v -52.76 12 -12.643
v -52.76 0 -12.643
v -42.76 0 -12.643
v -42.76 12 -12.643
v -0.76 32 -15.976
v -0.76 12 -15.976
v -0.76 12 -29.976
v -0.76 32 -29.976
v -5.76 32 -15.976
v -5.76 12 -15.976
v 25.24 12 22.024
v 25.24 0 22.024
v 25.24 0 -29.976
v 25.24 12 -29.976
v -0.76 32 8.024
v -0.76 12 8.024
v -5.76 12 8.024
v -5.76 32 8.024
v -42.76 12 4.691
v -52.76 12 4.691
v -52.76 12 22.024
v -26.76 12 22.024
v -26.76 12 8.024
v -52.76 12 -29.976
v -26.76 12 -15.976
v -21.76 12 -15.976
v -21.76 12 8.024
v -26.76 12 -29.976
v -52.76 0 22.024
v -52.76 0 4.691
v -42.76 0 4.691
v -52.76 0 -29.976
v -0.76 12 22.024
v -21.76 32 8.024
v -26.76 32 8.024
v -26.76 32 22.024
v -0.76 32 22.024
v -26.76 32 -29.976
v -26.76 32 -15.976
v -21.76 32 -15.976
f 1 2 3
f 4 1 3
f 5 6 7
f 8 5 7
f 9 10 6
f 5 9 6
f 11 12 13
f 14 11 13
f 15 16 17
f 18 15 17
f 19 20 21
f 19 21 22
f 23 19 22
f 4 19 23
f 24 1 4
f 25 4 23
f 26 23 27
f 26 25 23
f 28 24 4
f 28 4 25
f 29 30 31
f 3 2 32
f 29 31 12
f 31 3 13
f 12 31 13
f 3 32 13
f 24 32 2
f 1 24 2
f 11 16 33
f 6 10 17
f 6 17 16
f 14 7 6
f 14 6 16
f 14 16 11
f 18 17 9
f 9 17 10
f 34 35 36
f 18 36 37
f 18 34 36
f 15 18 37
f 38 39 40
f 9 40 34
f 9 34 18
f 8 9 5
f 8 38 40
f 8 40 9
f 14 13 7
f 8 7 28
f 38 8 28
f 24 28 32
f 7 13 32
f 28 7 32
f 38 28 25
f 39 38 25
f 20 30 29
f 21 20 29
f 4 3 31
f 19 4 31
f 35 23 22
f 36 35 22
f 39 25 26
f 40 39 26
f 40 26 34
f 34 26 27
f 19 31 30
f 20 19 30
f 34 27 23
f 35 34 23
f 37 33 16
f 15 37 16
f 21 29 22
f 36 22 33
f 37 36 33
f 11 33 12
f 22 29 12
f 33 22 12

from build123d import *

# Parameters (mm, degrees)
BOSS_EXTRUDE5_DEPTH   = 12
BOSS_EXTRUDE5_2_DEPTH = 12
BOSS_EXTRUDE6_DEPTH   = 32


with BuildPart() as part:
    # Sketch6 → Boss-Extrude5 (new body)
    with BuildSketch(Plane(origin=(0, 0, 0), x_dir=(1, 0, 0), z_dir=(0, 1, 0))):
        Polygon((-26.75977594, 29.975997565), (-52.75977594, 29.975997565), (-52.75977594, 12.642664232), (-42.75977594, 12.642664232), (-42.75977594, -4.690669102), (-52.75977594, -4.690669102), (-52.75977594, -22.024002435), (-26.75977594, -22.024002435), (-26.75977594, -8.024002435), (-21.75977594, -8.024002435), (-21.75977594, 15.975997565), (-26.75977594, 15.975997565), align=None)
    extrude(amount=BOSS_EXTRUDE5_DEPTH)



with BuildPart() as body_2:
    # Sketch6 → Boss-Extrude5 2 (new body)
    with BuildSketch(Plane(origin=(0, 0, 0), x_dir=(1, 0, 0), z_dir=(0, 1, 0))):
        Polygon((25.24022406, 29.975997565), (-0.75977594, 29.975997565), (-0.75977594, 15.975997565), (-5.75977594, 15.975997565), (-5.75977594, -8.024002435), (-0.75977594, -8.024002435), (-0.75977594, -22.024002435), (25.24022406, -22.024002435), align=None)
    extrude(amount=BOSS_EXTRUDE5_2_DEPTH)


with BuildPart() as part_1:
    add(part.part)

    add(body_2.part)  # Boss-Extrude6 merges body 2
    # Sketch6<3> → Boss-Extrude6 (add)
    with BuildSketch(Plane(origin=(0, 0, 0), x_dir=(1, 0, 0), z_dir=(0, 1, 0))):
        Polygon((-0.75977594, 29.975997565), (-26.75977594, 29.975997565), (-26.75977594, 15.975997565), (-21.75977594, 15.975997565), (-21.75977594, -8.024002435), (-26.75977594, -8.024002435), (-26.75977594, -22.024002435), (-0.75977594, -22.024002435), (-0.75977594, -8.024002435), (-5.75977594, -8.024002435), (-5.75977594, 15.975997565), (-0.75977594, 15.975997565), align=None)
    extrude(amount=BOSS_EXTRUDE6_DEPTH)


solid = part_1.part
